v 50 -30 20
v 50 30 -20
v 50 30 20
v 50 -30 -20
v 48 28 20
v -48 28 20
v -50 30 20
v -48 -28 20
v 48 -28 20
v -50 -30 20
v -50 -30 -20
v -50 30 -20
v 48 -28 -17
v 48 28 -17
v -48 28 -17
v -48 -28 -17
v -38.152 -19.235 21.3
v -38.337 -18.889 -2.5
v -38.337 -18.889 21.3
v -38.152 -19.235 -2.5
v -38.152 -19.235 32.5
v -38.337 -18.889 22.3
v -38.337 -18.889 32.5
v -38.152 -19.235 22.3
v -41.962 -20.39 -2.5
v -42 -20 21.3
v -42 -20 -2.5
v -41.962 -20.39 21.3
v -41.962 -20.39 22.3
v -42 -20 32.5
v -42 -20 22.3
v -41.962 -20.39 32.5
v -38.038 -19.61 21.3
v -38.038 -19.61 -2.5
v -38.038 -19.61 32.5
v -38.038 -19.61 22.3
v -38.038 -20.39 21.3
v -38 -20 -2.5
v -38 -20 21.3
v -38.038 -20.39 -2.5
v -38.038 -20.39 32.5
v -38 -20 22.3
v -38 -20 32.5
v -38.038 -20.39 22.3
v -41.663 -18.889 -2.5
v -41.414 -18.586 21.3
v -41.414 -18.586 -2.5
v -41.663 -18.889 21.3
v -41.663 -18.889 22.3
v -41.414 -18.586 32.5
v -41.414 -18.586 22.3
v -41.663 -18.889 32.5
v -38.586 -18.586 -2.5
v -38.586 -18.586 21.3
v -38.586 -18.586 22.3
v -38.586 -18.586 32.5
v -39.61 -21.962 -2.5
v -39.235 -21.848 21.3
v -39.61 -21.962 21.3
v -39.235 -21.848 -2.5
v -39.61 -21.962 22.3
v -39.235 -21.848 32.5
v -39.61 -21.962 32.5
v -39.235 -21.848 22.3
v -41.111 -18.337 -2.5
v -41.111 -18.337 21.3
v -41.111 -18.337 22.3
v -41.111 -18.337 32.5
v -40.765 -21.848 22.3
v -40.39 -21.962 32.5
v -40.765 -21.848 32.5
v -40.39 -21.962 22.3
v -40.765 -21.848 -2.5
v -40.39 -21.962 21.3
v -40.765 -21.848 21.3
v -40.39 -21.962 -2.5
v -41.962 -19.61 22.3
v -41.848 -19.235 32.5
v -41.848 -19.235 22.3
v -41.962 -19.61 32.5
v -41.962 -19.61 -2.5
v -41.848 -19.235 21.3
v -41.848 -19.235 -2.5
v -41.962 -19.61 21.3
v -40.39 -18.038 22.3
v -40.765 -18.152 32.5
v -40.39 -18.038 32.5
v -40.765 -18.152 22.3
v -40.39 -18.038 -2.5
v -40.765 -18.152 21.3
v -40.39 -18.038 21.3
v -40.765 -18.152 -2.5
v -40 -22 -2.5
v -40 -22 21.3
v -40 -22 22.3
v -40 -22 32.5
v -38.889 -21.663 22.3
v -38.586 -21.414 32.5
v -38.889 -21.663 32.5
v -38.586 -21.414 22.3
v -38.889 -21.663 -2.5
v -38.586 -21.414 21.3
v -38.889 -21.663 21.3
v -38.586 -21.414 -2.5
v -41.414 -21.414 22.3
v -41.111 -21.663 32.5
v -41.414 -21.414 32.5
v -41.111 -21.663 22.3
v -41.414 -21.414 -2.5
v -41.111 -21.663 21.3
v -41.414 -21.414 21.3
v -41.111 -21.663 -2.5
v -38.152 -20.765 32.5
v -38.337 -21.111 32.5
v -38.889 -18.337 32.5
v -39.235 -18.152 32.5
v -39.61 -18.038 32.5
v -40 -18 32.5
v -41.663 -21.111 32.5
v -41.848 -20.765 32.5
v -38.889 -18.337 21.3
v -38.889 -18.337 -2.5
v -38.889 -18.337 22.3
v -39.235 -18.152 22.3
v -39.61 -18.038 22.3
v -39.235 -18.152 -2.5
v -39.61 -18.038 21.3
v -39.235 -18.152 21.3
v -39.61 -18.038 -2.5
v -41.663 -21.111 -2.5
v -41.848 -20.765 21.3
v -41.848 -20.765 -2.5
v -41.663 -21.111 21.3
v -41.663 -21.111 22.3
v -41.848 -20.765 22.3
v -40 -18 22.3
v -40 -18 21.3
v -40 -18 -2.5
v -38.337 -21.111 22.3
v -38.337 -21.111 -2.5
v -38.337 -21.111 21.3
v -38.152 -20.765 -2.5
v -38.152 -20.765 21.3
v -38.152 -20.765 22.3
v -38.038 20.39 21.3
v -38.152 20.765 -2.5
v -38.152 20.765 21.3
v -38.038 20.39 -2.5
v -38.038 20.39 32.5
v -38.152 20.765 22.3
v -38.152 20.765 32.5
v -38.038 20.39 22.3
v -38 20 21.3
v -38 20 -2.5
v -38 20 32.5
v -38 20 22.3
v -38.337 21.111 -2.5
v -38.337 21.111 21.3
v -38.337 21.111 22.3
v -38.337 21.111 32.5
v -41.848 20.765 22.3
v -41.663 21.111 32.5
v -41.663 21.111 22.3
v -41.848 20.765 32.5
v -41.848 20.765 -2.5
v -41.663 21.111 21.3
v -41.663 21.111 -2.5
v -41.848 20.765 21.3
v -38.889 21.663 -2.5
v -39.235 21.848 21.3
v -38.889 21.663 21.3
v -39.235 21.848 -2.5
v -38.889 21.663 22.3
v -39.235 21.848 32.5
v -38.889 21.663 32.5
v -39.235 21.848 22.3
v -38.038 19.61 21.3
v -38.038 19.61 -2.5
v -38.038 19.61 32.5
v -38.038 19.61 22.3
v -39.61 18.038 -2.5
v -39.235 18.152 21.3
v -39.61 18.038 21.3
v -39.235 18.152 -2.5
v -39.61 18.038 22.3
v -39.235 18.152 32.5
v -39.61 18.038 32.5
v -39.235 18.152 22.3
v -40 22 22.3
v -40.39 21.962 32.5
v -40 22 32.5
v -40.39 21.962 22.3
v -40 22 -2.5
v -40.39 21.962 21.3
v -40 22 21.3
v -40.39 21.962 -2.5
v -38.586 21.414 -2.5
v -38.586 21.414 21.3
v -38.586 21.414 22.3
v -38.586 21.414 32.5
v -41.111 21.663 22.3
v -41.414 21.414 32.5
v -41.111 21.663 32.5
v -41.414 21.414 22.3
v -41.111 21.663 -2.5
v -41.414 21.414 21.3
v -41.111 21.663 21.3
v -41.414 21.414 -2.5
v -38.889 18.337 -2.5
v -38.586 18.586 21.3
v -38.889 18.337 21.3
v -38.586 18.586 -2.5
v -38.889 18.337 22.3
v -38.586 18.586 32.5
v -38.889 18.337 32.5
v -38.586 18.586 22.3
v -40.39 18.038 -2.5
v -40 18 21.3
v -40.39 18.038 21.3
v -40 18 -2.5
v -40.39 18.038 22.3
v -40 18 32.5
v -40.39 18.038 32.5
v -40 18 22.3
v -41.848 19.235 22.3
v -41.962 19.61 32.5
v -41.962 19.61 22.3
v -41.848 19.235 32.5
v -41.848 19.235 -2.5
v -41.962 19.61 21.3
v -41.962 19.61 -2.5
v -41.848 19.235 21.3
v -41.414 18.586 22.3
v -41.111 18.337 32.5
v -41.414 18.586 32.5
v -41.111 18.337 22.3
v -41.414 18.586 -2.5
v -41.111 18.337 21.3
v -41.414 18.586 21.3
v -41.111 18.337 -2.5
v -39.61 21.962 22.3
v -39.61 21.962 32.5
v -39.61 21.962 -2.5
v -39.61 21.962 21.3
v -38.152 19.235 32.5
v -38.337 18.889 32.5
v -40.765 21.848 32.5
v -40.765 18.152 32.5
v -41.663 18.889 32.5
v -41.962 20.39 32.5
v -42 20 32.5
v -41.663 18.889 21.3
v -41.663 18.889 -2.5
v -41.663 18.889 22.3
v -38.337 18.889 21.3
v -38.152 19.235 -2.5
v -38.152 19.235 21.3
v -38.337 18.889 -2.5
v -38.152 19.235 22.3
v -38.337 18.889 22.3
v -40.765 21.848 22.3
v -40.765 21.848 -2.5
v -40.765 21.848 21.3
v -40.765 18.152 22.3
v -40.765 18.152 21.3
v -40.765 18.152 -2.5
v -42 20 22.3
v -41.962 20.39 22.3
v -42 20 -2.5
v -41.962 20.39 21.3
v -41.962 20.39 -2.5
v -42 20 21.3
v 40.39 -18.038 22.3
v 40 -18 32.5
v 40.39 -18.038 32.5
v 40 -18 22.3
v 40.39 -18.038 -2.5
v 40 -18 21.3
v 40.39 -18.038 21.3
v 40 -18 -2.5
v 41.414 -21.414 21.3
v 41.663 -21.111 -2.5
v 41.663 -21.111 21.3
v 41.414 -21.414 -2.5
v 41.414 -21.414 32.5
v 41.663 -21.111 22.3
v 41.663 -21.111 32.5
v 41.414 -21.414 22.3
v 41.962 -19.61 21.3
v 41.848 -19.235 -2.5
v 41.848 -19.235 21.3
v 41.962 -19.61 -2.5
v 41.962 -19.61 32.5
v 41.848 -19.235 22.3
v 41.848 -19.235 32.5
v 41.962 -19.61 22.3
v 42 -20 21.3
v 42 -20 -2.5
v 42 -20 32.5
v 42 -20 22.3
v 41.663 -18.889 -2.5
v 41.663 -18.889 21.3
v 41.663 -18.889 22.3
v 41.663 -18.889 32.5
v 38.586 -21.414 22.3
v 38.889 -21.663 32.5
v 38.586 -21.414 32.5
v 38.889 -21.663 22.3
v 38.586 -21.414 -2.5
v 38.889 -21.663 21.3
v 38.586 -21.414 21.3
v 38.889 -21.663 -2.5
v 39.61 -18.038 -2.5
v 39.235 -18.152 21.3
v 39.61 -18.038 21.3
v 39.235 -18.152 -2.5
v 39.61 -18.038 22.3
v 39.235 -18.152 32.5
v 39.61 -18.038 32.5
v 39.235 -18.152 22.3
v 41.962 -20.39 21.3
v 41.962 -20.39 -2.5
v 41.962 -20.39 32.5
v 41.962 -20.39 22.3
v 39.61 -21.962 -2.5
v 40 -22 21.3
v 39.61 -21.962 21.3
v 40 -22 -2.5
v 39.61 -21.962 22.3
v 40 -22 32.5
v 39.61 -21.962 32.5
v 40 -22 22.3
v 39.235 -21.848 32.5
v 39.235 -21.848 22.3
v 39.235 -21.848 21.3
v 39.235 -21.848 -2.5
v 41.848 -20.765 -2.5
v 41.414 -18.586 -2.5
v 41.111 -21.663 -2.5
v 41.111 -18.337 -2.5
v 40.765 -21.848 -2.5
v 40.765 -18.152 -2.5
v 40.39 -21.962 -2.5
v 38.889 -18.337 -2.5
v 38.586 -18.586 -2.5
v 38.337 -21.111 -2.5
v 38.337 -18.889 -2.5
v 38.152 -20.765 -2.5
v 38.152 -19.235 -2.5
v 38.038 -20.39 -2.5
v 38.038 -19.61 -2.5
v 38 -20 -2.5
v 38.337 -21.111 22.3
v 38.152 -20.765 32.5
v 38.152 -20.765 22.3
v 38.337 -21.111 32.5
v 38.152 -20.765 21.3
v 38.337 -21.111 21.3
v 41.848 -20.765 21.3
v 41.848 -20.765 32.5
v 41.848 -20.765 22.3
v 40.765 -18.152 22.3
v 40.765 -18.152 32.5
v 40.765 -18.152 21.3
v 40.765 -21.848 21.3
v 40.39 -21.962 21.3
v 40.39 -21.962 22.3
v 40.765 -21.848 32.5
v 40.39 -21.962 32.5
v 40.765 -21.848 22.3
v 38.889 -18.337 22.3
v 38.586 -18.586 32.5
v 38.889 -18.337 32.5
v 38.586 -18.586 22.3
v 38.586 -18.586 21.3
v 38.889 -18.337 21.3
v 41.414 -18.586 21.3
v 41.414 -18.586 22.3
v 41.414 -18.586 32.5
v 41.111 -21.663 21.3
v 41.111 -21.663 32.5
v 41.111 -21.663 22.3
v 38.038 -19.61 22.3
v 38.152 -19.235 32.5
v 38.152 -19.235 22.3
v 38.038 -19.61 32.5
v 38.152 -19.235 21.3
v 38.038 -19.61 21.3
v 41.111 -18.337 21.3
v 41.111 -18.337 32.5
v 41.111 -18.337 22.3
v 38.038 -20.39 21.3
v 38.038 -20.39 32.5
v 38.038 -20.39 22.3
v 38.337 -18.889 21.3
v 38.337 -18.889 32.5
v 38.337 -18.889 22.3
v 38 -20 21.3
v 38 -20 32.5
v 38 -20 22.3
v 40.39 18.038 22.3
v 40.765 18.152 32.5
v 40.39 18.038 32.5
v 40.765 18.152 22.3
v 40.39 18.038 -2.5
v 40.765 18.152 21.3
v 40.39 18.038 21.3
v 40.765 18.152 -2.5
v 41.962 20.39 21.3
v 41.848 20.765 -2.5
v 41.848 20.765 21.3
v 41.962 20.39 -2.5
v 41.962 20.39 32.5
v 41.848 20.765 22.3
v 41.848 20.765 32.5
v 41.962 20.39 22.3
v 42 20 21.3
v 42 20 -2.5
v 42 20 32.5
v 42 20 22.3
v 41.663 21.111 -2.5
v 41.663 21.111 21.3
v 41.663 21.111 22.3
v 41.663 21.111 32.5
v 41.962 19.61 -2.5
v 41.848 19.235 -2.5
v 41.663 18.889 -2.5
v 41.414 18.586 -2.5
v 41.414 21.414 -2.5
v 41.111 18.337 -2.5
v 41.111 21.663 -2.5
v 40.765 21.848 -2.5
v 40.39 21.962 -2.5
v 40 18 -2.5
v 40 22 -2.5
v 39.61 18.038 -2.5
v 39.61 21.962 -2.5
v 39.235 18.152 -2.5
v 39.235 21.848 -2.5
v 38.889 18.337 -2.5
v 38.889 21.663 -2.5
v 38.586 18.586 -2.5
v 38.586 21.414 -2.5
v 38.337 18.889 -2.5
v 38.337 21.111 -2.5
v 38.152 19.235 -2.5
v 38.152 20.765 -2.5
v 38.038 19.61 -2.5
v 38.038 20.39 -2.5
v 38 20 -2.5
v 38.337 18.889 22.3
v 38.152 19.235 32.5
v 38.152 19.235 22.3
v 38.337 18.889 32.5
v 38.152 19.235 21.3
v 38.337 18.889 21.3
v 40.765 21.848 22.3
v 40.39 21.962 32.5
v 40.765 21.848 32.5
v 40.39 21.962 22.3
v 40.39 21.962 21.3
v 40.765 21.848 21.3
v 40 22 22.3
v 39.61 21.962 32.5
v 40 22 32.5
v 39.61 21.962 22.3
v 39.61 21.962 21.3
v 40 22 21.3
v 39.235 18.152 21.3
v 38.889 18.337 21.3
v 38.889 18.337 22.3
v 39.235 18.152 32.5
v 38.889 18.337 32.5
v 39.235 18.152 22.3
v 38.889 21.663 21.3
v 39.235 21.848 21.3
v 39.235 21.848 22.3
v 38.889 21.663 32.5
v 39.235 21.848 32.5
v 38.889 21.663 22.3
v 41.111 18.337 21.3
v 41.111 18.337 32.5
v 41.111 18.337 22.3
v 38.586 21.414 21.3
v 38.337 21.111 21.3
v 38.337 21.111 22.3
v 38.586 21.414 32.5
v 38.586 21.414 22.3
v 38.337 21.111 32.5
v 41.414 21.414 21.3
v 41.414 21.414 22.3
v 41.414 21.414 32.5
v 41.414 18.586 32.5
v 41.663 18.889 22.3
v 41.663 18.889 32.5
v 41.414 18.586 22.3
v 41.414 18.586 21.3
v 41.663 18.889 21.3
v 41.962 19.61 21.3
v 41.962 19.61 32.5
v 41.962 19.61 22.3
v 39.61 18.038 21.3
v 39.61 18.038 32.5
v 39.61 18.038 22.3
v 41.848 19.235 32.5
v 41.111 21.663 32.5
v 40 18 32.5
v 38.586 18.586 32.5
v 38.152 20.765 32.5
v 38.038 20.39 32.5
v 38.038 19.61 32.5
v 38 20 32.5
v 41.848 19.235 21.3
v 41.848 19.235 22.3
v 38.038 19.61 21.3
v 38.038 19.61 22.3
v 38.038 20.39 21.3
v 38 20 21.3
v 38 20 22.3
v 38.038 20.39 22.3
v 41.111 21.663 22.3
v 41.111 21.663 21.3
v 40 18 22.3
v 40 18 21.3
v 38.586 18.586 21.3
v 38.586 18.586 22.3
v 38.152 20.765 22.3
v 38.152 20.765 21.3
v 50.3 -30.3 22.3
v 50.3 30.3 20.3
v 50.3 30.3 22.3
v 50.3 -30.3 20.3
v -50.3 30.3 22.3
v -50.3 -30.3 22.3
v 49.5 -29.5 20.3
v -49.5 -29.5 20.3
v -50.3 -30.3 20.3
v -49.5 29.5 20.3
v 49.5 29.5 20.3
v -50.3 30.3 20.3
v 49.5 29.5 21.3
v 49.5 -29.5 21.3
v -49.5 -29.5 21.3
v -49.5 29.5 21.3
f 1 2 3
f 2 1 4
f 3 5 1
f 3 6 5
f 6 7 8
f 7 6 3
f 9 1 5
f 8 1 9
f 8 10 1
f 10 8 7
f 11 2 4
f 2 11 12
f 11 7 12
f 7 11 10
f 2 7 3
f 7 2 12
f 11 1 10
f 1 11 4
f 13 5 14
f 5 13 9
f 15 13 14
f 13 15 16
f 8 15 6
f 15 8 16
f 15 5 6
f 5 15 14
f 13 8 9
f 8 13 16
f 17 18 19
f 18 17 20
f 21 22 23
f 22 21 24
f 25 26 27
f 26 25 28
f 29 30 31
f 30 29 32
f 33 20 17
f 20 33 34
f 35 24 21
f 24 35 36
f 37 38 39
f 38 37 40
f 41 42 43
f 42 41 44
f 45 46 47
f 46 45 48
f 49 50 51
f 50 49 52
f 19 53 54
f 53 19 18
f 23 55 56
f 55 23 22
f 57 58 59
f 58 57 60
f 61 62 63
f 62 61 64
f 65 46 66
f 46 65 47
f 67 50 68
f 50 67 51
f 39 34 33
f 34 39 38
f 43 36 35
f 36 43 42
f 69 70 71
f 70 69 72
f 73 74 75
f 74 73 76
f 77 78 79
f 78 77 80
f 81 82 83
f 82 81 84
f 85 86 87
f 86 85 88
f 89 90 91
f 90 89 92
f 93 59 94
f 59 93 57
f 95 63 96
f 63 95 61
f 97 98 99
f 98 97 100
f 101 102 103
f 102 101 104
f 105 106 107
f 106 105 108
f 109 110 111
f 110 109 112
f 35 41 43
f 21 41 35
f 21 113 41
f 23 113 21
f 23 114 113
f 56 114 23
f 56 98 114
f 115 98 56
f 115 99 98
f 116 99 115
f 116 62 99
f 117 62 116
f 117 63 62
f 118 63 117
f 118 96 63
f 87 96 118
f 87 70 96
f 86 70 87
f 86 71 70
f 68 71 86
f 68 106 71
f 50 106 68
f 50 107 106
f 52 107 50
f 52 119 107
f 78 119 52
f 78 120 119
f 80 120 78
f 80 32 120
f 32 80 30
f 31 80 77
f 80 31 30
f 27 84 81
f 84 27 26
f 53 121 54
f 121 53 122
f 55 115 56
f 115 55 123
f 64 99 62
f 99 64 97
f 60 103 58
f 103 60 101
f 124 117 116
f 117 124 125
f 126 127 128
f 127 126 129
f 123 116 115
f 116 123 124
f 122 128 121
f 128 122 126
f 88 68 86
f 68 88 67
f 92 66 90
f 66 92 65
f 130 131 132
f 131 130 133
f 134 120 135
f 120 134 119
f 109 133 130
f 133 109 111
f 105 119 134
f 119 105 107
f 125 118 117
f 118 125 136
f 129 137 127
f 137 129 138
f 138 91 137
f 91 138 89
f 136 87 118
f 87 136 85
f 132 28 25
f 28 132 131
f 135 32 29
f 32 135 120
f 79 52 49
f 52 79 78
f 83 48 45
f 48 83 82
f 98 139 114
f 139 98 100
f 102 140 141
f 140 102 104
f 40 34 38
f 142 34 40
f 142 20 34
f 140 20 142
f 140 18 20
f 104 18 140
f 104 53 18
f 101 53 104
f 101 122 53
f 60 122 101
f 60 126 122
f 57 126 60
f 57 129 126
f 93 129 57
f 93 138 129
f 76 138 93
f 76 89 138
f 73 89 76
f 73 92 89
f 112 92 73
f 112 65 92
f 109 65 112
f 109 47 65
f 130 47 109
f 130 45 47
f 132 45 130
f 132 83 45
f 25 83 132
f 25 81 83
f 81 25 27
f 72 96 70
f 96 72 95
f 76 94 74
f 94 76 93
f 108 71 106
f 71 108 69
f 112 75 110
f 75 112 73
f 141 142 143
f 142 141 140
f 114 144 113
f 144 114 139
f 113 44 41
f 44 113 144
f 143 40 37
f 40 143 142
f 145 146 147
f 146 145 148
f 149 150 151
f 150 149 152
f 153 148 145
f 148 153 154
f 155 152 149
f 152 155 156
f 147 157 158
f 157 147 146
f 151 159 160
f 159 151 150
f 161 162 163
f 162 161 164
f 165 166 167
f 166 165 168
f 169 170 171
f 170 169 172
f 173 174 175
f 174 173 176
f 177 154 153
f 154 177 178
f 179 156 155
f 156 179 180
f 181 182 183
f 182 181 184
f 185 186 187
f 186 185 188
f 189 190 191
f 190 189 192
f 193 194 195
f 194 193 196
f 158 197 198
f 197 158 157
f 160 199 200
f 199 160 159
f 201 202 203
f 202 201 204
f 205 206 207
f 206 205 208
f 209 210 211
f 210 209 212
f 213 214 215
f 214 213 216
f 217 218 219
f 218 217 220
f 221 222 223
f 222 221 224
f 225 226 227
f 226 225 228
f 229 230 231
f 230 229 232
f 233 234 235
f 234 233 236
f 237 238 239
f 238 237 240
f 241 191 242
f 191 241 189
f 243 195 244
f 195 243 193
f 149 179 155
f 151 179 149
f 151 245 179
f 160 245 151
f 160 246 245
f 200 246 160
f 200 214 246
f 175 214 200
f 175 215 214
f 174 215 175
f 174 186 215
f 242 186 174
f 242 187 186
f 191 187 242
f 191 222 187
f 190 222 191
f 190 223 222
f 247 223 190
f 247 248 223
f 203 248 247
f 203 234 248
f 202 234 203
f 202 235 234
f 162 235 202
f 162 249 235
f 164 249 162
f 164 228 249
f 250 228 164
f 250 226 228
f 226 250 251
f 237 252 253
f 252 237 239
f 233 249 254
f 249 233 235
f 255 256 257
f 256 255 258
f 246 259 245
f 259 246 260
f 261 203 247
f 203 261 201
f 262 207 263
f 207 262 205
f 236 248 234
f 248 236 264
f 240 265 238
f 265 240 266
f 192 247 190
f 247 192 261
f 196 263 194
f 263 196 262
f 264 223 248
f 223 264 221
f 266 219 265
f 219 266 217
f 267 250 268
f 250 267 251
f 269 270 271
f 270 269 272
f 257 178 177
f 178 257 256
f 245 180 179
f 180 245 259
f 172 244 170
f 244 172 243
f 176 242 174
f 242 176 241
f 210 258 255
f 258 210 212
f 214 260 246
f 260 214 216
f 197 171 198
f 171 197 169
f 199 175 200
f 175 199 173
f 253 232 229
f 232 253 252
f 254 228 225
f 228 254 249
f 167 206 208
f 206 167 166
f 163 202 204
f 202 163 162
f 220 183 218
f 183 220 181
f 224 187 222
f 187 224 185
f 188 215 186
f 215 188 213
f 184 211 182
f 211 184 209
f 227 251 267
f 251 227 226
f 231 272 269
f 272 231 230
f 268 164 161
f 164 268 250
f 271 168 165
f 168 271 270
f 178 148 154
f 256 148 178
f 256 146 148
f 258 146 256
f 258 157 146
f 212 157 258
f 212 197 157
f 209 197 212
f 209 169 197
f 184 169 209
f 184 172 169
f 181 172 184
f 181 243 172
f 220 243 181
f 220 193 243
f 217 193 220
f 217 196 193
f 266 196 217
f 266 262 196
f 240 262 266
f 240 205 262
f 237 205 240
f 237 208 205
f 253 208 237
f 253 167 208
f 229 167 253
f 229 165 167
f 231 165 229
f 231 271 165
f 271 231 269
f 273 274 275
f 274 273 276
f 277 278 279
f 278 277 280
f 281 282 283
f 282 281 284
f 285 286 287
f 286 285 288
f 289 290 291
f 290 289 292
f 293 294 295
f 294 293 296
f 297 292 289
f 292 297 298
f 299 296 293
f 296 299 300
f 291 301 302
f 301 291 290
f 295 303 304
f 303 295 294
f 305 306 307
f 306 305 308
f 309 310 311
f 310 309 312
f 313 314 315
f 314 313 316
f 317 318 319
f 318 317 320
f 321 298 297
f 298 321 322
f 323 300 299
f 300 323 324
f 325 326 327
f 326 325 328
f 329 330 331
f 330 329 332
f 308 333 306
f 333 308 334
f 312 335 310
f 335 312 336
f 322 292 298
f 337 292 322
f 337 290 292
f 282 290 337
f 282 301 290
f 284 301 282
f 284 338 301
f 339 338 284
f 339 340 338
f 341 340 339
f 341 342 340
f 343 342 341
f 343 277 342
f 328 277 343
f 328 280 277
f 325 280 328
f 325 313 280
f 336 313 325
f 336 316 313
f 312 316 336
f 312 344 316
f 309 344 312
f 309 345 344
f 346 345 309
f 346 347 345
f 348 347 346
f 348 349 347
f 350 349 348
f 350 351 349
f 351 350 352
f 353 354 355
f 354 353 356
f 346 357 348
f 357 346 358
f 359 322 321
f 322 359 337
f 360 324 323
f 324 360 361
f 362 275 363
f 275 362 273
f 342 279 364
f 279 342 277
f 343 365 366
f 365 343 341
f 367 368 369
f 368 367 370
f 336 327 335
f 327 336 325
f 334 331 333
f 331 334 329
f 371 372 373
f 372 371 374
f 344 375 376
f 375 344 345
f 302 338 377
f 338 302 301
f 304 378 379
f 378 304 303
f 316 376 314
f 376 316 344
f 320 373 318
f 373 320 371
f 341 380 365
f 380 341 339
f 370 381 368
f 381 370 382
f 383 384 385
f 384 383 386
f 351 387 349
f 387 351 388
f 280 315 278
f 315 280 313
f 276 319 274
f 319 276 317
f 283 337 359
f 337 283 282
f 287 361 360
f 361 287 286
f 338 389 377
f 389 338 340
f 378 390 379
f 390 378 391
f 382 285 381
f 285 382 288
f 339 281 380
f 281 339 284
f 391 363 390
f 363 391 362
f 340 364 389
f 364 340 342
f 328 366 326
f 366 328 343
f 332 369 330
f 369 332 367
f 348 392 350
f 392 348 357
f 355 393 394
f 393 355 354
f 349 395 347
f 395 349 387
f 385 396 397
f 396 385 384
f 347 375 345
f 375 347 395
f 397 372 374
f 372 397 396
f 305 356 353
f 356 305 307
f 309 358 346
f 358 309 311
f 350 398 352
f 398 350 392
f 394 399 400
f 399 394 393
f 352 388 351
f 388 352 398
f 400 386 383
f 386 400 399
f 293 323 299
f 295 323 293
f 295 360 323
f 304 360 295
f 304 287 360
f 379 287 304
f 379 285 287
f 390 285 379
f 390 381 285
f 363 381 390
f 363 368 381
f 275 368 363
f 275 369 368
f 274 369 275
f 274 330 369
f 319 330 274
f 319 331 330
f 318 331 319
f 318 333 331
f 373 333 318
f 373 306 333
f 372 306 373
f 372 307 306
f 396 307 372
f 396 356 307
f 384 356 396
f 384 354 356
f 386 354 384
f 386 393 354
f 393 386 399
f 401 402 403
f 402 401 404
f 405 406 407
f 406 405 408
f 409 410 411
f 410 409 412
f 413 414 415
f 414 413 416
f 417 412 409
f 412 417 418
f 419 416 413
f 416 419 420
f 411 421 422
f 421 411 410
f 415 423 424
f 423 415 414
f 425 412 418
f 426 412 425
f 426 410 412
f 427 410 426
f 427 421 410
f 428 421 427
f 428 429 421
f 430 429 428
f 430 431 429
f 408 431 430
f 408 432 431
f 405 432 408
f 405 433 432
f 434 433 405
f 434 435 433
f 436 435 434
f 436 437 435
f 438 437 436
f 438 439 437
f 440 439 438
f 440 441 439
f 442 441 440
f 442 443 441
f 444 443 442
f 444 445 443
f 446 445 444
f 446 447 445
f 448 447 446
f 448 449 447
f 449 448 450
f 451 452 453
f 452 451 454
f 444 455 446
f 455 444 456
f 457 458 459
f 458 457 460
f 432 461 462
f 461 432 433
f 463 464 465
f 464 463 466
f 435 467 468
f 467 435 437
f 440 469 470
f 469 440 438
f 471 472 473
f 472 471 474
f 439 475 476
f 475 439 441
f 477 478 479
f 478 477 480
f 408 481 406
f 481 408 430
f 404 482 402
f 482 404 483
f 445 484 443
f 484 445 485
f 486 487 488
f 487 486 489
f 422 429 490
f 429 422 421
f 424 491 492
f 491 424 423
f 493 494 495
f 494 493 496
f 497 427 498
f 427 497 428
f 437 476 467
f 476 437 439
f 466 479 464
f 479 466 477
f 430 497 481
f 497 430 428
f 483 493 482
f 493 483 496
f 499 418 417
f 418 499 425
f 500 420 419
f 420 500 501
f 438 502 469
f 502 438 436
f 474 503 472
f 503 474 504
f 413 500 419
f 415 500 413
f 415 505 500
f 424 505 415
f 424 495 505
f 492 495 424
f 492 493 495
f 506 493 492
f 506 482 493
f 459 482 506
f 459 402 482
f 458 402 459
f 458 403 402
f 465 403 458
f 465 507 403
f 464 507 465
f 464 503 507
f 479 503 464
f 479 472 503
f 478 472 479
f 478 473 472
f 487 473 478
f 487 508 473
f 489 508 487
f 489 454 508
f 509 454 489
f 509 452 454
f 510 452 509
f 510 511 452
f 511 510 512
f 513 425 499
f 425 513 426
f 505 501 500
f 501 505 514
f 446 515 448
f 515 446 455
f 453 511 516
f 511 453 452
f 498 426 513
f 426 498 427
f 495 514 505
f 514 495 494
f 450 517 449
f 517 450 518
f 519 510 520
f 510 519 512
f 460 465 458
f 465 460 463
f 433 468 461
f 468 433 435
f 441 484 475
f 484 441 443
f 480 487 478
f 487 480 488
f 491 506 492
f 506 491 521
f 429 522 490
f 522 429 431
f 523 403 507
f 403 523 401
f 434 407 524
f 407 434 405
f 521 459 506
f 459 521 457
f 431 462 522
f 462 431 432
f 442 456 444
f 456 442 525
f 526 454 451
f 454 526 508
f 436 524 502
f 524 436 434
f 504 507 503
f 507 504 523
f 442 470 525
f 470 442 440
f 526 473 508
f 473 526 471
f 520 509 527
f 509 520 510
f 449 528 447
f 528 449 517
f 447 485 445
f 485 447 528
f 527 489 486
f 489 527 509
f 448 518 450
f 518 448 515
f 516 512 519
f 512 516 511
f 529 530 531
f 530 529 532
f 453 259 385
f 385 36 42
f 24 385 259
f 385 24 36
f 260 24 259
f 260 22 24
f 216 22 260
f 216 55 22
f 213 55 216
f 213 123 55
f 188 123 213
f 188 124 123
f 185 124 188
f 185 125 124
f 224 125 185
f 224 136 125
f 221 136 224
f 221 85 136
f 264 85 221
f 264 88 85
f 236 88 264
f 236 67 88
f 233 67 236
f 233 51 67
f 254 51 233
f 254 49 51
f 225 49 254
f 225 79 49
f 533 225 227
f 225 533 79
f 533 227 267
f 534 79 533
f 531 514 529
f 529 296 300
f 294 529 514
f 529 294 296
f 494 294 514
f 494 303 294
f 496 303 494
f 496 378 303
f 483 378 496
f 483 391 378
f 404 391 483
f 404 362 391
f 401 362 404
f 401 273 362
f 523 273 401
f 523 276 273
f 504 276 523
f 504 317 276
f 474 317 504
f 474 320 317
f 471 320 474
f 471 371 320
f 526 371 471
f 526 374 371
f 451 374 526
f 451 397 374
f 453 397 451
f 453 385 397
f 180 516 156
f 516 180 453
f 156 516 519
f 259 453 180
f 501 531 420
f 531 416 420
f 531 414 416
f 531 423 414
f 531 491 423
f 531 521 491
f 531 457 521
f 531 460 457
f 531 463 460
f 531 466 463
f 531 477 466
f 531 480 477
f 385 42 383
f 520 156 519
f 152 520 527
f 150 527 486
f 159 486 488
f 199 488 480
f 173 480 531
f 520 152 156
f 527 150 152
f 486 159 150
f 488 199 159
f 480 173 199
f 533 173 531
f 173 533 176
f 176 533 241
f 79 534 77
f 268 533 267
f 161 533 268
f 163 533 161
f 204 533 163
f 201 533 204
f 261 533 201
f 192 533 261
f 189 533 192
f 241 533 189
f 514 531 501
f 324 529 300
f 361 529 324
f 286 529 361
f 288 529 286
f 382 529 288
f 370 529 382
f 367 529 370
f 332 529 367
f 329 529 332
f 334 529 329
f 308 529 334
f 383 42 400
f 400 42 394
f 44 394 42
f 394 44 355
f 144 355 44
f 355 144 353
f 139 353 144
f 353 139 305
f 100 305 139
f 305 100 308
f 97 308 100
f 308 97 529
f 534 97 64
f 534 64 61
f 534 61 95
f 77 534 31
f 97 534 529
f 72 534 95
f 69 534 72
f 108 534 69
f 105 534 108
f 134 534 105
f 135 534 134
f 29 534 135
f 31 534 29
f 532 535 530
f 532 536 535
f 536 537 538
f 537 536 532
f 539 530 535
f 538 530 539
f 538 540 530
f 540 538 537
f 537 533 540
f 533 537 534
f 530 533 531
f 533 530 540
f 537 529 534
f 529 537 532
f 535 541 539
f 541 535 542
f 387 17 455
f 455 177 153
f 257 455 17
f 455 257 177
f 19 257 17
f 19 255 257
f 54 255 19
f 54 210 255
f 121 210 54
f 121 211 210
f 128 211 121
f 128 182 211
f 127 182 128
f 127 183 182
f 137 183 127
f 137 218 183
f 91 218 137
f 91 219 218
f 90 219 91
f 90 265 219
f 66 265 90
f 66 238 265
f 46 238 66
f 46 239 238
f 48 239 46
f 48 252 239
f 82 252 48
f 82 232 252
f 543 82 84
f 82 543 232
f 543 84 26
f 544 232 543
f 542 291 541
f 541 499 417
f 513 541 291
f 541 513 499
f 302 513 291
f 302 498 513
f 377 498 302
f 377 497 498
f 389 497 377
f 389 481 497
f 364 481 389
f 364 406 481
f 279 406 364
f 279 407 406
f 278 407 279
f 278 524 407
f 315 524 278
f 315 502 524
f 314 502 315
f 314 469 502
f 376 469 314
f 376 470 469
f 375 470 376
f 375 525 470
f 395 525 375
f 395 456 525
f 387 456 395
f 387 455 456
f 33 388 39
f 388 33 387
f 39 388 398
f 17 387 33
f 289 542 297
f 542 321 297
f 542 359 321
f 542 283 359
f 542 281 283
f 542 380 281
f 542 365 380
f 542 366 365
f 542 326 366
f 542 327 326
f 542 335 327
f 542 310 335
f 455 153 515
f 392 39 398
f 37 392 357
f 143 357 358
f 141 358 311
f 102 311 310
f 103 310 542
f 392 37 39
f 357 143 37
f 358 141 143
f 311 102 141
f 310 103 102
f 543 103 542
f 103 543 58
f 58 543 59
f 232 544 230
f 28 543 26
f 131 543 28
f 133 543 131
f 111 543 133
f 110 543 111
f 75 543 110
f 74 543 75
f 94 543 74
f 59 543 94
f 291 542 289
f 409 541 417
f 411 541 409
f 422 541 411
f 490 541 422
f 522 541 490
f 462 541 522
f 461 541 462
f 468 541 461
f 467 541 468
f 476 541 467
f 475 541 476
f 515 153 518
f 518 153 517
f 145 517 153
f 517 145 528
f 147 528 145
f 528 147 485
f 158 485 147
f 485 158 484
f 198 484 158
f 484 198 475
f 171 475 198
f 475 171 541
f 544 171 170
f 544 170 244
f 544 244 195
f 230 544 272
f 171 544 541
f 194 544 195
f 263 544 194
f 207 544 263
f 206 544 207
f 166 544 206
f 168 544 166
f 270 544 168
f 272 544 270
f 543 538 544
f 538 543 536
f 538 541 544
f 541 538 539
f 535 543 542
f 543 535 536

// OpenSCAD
/*
 * OpenSCAD Design Template (writing-scad-v2)
 *
 * Use this as a starting point for any new design.
 * Copy and adapt, don't start from scratch.
 *
 * Key rule: All dimensions are parameters. No magic numbers.
 */

// ===================================================================
// [1] PARAMETERS - Everything starts here
// ===================================================================

// [A] BASE DIMENSIONS
// These are your fundamental design inputs
base_l = 100;      // Overall length (X)
base_w = 60;       // Overall width (Y)
base_h = 40;       // Overall height (Z)

// [B] MATERIAL/PROCESS
// Affects printability and geometry
wall_t = 2;        // Wall thickness
nozzle_dia = 0.4;  // Printer nozzle diameter
layer_h = 0.2;     // Layer height (use 0.15, 0.2, 0.3)
min_feature = 0.8; // Minimum printable feature

// [C] FIT/TOLERANCE
// How parts interact with each other
fit_margin = 0.3;          // Sliding fit clearance
press_fit_margin = 0.1;    // Tight/press fit clearance
snap_fit_margin = 0.5;     // Snap clip clearance
chamfer_size = 0.5;        // Edge break for gluing

// [D] FEATURE TOGGLES
// What to include in the final render
include_lid = true;
include_posts = true;
include_features = true;
show_assembly = true;
debug_mode = false;

// [E] RENDERING
// Quality vs. speed tradeoff
preview_fn = 32;   // Fast preview
export_fn = 100;   // High-quality export
$fn = debug_mode ? export_fn : preview_fn;


// ===================================================================
// [2] INCLUDES & HELPER MODULES
// ===================================================================

// Include shared parameters (if multi-part project)
// include <../params.scad>;

// Use shared modules (library code)
// use <../lib/common.scad>;

// Example helper module (optional)
module corner_relief(x, y, z, r=1) {
    translate([x - r, y - r, z]) sphere(r=r, $fn=$fn);
}


// ===================================================================
// [3] FUNCTIONS - Computed Dimensions
// ===================================================================

// Derived dimensions from base + material params
function interior_l(l, t) = l - 2*t;
function interior_w(w, t) = w - 2*t;
function interior_h(h, t) = h - t;

// Tolerance & fit functions
function peg_hole_dia(nominal, margin=fit_margin) = nominal + margin;
function press_fit_hole_dia(nominal) = nominal - press_fit_margin;
function snap_fit_gap(nominal) = nominal + snap_fit_margin;

// Layout/positioning functions
function center_offset_x(width) = -width/2;
function center_offset_y(length) = -length/2;

// Verification (for console output)
function verify_wall_thickness() =
    wall_t < min_feature ? echo("WARNING: Wall too thin!") : echo("Wall OK");


// ===================================================================
// [4] MODULES - Design Building Blocks
// ===================================================================

/**
 * Base box with hollow interior
 */
module base_box(
    l=base_l,
    w=base_w,
    h=base_h,
    t=wall_t,
    fn=$fn
) {
    difference() {
        cube([l, w, h], center=true);
        translate([0, 0, t])
            cube([
                interior_l(l, t),
                interior_w(w, t),
                interior_h(h, t)
            ], center=true);
    }
}

/**
 * Lid with lip for fitting over box
 */
module lid(
    l=base_l,
    w=base_w,
    h=base_h,
    t=wall_t,
    margin=fit_margin,
    fn=$fn
) {
    // Lip sits on top of walls
    translate([0, 0, h/2 + t/2 + margin])
        difference() {
            // Outer dimensions
            cube([l + 2*margin, w + 2*margin, t], center=true);

            // Inner cutout for grip
            translate([0, 0, -t/2])
                cube([
                    interior_l(l, 0.5),
                    interior_w(w, 0.5),
                    t
                ], center=true);
        }
}

/**
 * Support posts (structural elements)
 */
module support_posts(
    count_x=2,
    count_y=2,
    spacing_x=base_l - 20,
    spacing_y=base_w - 20,
    dia=4,
    h=base_h - 5,
    fn=$fn
) {
    if (count_x > 0 && count_y > 0) {
        for (x_i = [0 : count_x - 1]) {
            for (y_i = [0 : count_y - 1]) {
                x_pos = (x_i - (count_x - 1)/2) * spacing_x;
                y_pos = (y_i - (count_y - 1)/2) * spacing_y;

                translate([x_pos, y_pos, -base_h/2 + h/2])
                    cylinder(d=dia, h=h, $fn=fn);
            }
        }
    }
}

/**
 * Complete assembly (for visualization)
 */
module assembly(fn=$fn) {
    // Main body
    base_box(fn=fn);

    // Optional features
    if (include_posts) {
        support_posts(count_x=2, count_y=2, fn=fn);
    }

    if (include_lid) {
        color([1, 0.5, 0, 0.8]) lid(fn=fn);
    }

    // Debug visualization
    if (debug_mode) {
        %color([0, 0, 1, 0.2]) cube([base_l, base_w, 2], center=true);
    }
}


// ===================================================================
// [5] RENDER - Single Entry Point
// ===================================================================

// Call assembly directly
assembly();

/*
VALIDATION CHECKLIST:
════════════════════════════════════════════════════════════════════
□ All dimensions in PARAMETERS section (lines 1-50)
□ No hard-coded numbers below line 50 (except 0, 1, -1)
□ Every module has defaults matching globals
□ Derived dimensions use functions, not repeated math
□ Can toggle features with booleans (include_X)
□ Changing base_l updates entire design
□ Margin/clearance params exist for all fits
□ $fn is explicit (preview_fn vs export_fn)
□ Module composition is clear (simple → complex)
□ Functions exist for repeated calculations
════════════════════════════════════════════════════════════════════

EXPORT INSTRUCTIONS:
1. Set $fn = 100 (high quality) near the top
2. Hit F6 (Render, not Preview)
3. Wait for completion
4. Export → Export as STL
5. Save to appropriate location

CUSTOMIZATION:
- Change base_l, base_w, base_h for size variants
- Adjust wall_t for strength/weight tradeoff
- Set include_lid = false to hide lid
- Set debug_mode = true to see structure
*/
